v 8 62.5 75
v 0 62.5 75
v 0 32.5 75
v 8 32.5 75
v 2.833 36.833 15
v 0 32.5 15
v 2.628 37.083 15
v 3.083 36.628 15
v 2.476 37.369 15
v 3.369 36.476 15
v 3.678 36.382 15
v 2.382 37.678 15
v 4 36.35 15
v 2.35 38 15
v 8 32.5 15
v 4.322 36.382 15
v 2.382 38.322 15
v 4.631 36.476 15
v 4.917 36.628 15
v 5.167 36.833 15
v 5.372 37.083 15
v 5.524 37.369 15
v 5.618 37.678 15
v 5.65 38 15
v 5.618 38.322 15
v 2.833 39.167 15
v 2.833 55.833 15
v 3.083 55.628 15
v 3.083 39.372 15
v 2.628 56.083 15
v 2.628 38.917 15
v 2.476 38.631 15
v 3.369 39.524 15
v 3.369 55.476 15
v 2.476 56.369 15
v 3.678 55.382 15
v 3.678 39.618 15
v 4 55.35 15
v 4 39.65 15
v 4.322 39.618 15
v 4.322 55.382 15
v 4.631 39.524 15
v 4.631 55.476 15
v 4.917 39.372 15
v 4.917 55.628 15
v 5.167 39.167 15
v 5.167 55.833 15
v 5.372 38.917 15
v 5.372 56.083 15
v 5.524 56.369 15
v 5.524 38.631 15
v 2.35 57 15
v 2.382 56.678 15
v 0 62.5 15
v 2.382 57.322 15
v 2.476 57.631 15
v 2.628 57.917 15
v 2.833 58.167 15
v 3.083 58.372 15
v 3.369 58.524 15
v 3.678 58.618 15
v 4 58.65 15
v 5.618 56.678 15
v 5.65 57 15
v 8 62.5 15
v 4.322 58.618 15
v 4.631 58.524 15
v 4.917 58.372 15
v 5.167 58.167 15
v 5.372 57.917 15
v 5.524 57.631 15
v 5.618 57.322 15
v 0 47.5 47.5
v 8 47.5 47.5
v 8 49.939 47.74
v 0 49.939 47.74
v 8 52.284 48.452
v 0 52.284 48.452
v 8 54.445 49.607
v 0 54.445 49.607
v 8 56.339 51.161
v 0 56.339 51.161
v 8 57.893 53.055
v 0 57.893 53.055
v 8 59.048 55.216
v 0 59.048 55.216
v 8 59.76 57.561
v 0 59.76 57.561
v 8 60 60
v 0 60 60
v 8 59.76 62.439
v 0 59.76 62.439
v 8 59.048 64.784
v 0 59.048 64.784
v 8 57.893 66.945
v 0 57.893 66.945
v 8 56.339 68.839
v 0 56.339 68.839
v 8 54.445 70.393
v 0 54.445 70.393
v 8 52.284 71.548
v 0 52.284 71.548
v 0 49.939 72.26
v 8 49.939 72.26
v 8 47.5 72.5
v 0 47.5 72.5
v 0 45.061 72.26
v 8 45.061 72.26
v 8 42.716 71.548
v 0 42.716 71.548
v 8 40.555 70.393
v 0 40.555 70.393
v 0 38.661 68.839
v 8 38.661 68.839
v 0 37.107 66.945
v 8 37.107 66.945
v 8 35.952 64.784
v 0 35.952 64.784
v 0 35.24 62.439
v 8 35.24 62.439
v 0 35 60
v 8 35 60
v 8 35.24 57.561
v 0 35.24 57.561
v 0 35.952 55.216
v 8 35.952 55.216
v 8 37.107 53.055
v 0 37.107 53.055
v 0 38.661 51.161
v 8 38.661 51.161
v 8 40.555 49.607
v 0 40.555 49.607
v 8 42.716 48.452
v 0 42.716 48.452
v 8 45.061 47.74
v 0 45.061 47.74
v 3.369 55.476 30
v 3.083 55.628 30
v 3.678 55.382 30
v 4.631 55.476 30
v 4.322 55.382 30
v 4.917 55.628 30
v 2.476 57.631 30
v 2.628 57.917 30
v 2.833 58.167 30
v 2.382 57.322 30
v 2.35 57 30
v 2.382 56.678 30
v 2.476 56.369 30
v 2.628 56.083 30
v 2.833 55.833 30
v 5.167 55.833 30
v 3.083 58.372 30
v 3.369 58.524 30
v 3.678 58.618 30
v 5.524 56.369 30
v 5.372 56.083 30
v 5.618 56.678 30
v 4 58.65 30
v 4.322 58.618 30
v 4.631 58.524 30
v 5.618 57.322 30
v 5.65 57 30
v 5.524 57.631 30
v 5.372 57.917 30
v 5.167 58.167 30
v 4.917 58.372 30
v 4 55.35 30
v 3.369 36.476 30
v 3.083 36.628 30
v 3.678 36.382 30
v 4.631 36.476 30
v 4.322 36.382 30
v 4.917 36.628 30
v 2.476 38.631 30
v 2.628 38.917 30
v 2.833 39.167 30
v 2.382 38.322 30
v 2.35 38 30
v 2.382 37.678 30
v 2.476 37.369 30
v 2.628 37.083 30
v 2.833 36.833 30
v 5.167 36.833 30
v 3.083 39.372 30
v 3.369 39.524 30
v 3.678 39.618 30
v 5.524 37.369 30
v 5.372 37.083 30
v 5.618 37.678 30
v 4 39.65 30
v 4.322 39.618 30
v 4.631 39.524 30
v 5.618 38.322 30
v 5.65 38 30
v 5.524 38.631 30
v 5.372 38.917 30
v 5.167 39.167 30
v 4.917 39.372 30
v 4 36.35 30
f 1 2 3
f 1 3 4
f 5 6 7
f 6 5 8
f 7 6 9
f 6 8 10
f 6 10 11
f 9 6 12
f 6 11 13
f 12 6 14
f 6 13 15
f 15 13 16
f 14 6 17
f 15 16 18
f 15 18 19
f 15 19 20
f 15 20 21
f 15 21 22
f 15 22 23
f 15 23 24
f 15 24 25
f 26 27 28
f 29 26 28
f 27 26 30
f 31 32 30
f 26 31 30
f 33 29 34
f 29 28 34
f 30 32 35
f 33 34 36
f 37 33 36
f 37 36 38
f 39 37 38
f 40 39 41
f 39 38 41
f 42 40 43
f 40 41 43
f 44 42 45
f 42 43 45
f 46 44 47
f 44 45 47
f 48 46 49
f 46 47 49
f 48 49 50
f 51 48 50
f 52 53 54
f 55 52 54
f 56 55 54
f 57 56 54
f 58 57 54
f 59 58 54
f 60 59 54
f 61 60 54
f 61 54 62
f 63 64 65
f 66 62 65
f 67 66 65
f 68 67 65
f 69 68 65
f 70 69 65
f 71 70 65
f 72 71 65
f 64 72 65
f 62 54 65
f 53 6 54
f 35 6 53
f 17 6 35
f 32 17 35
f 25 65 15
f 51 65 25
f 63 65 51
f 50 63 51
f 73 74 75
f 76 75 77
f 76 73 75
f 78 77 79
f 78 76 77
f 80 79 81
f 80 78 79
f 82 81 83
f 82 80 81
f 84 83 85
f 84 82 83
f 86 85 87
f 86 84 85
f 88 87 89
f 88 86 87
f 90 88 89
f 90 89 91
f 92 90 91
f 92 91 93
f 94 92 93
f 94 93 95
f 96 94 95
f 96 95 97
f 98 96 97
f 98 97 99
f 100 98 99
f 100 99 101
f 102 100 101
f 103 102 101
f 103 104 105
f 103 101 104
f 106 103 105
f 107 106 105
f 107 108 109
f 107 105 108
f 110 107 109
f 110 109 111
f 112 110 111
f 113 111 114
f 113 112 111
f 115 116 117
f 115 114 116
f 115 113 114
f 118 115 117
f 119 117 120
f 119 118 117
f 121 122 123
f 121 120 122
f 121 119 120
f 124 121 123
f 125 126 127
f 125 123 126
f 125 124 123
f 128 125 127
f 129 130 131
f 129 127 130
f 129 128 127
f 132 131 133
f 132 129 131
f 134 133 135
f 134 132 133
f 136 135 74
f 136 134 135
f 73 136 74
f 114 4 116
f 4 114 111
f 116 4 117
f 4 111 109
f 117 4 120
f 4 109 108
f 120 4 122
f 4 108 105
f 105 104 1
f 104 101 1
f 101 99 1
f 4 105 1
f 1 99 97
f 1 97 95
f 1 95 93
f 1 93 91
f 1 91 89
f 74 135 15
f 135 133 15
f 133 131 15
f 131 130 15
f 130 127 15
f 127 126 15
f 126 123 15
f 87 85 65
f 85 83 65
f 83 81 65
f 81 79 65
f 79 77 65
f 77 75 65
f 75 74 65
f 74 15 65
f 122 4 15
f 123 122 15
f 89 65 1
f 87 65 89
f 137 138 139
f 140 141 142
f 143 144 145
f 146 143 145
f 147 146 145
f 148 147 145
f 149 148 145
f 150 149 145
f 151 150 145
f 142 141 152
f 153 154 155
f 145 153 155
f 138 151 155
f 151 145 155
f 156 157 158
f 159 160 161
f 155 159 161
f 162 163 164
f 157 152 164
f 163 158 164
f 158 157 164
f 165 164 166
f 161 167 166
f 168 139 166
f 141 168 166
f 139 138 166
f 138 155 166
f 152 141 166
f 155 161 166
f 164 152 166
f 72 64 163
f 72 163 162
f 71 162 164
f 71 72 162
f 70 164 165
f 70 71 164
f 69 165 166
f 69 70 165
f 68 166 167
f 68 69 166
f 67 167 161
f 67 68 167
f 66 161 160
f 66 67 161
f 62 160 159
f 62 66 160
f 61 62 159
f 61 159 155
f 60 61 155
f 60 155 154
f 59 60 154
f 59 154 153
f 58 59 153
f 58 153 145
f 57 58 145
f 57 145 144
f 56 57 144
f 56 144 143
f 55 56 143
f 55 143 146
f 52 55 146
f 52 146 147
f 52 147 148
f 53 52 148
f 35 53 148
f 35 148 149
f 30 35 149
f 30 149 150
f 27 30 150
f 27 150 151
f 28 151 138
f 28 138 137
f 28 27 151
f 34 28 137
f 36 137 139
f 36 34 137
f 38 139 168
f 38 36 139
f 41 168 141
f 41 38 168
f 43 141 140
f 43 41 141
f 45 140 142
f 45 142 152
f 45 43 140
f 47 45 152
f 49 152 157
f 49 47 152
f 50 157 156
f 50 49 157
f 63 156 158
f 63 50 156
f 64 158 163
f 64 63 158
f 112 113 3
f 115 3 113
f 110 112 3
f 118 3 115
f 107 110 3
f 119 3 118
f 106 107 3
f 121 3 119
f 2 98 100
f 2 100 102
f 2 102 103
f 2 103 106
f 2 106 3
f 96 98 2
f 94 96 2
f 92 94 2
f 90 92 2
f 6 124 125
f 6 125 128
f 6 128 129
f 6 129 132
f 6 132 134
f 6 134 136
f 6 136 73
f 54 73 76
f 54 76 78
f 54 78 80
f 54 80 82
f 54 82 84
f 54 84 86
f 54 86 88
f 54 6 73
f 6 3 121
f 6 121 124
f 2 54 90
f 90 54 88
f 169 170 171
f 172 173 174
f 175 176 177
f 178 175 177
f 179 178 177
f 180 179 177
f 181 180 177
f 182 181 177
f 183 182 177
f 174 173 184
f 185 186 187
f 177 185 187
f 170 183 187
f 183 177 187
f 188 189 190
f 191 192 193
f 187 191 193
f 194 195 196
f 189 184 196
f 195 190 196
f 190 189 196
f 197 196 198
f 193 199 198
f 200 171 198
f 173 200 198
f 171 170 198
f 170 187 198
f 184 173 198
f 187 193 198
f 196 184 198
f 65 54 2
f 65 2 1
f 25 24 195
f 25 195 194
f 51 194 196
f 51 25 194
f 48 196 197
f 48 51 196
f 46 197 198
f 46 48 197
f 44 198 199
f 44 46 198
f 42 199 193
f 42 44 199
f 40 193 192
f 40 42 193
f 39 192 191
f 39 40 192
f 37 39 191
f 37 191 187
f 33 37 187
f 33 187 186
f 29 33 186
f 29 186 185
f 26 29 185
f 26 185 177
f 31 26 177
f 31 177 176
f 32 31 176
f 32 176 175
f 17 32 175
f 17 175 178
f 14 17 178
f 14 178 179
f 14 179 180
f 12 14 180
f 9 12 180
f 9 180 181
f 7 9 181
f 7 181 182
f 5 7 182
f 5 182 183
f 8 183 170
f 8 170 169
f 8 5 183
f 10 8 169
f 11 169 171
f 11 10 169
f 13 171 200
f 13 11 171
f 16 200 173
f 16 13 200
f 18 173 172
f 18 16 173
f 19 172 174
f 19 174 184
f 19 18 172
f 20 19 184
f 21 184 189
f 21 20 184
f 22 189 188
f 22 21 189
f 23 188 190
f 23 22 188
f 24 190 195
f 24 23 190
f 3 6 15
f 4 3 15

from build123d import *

# Parameters (mm, degrees)
CYLINDER018_R     = 1.65
CYLINDER018_DEPTH = 20
CYLINDER019_R     = 1.65
CYLINDER019_DEPTH = 20
CYLINDER011_R     = 12.5
CYLINDER011_DEPTH = 10
BOX002_W          = 8
BOX002_H          = 30
BOX002_DEPTH      = 60


with BuildPart() as zylinder018:
    # Cylinder018 → Cylinder018 (new body)
    with BuildSketch(Plane(origin=(4, 38, 10), x_dir=(1, 0, 0), z_dir=(0, 0, 1))):
        Circle(CYLINDER018_R)
    extrude(amount=CYLINDER018_DEPTH)


with BuildPart() as compound003:
    # Cylinder019 → Cylinder019 (new body)
    with BuildSketch(Plane(origin=(4, 57, 10), x_dir=(1, 0, 0), z_dir=(0, 0, 1))):
        Circle(CYLINDER019_R)
    extrude(amount=CYLINDER019_DEPTH)

    # Compound003: union Zylinder018
    add(zylinder018.part)


with BuildPart() as zylinder011:
    # Cylinder011 → Cylinder011 (new body)
    with BuildSketch(Plane(origin=(0, 47.5, 60), x_dir=(0, 0, -1), z_dir=(1, 0, 0))):
        Circle(CYLINDER011_R)
    extrude(amount=CYLINDER011_DEPTH)


with BuildPart() as cameraholder:
    # Box002 → Box002 (new body)
    with BuildSketch(Plane(origin=(0, 32.5, 15), x_dir=(1, 0, 0), z_dir=(0, 0, 1))):
        with Locations((4, 15)):
            Rectangle(BOX002_W, BOX002_H)
    extrude(amount=BOX002_DEPTH)

    # Cut003: cut Zylinder011
    add(zylinder011.part, mode=Mode.SUBTRACT)

    # Cut007: cut Compound003
    add(compound003.part, mode=Mode.SUBTRACT)


solid = cameraholder.part
